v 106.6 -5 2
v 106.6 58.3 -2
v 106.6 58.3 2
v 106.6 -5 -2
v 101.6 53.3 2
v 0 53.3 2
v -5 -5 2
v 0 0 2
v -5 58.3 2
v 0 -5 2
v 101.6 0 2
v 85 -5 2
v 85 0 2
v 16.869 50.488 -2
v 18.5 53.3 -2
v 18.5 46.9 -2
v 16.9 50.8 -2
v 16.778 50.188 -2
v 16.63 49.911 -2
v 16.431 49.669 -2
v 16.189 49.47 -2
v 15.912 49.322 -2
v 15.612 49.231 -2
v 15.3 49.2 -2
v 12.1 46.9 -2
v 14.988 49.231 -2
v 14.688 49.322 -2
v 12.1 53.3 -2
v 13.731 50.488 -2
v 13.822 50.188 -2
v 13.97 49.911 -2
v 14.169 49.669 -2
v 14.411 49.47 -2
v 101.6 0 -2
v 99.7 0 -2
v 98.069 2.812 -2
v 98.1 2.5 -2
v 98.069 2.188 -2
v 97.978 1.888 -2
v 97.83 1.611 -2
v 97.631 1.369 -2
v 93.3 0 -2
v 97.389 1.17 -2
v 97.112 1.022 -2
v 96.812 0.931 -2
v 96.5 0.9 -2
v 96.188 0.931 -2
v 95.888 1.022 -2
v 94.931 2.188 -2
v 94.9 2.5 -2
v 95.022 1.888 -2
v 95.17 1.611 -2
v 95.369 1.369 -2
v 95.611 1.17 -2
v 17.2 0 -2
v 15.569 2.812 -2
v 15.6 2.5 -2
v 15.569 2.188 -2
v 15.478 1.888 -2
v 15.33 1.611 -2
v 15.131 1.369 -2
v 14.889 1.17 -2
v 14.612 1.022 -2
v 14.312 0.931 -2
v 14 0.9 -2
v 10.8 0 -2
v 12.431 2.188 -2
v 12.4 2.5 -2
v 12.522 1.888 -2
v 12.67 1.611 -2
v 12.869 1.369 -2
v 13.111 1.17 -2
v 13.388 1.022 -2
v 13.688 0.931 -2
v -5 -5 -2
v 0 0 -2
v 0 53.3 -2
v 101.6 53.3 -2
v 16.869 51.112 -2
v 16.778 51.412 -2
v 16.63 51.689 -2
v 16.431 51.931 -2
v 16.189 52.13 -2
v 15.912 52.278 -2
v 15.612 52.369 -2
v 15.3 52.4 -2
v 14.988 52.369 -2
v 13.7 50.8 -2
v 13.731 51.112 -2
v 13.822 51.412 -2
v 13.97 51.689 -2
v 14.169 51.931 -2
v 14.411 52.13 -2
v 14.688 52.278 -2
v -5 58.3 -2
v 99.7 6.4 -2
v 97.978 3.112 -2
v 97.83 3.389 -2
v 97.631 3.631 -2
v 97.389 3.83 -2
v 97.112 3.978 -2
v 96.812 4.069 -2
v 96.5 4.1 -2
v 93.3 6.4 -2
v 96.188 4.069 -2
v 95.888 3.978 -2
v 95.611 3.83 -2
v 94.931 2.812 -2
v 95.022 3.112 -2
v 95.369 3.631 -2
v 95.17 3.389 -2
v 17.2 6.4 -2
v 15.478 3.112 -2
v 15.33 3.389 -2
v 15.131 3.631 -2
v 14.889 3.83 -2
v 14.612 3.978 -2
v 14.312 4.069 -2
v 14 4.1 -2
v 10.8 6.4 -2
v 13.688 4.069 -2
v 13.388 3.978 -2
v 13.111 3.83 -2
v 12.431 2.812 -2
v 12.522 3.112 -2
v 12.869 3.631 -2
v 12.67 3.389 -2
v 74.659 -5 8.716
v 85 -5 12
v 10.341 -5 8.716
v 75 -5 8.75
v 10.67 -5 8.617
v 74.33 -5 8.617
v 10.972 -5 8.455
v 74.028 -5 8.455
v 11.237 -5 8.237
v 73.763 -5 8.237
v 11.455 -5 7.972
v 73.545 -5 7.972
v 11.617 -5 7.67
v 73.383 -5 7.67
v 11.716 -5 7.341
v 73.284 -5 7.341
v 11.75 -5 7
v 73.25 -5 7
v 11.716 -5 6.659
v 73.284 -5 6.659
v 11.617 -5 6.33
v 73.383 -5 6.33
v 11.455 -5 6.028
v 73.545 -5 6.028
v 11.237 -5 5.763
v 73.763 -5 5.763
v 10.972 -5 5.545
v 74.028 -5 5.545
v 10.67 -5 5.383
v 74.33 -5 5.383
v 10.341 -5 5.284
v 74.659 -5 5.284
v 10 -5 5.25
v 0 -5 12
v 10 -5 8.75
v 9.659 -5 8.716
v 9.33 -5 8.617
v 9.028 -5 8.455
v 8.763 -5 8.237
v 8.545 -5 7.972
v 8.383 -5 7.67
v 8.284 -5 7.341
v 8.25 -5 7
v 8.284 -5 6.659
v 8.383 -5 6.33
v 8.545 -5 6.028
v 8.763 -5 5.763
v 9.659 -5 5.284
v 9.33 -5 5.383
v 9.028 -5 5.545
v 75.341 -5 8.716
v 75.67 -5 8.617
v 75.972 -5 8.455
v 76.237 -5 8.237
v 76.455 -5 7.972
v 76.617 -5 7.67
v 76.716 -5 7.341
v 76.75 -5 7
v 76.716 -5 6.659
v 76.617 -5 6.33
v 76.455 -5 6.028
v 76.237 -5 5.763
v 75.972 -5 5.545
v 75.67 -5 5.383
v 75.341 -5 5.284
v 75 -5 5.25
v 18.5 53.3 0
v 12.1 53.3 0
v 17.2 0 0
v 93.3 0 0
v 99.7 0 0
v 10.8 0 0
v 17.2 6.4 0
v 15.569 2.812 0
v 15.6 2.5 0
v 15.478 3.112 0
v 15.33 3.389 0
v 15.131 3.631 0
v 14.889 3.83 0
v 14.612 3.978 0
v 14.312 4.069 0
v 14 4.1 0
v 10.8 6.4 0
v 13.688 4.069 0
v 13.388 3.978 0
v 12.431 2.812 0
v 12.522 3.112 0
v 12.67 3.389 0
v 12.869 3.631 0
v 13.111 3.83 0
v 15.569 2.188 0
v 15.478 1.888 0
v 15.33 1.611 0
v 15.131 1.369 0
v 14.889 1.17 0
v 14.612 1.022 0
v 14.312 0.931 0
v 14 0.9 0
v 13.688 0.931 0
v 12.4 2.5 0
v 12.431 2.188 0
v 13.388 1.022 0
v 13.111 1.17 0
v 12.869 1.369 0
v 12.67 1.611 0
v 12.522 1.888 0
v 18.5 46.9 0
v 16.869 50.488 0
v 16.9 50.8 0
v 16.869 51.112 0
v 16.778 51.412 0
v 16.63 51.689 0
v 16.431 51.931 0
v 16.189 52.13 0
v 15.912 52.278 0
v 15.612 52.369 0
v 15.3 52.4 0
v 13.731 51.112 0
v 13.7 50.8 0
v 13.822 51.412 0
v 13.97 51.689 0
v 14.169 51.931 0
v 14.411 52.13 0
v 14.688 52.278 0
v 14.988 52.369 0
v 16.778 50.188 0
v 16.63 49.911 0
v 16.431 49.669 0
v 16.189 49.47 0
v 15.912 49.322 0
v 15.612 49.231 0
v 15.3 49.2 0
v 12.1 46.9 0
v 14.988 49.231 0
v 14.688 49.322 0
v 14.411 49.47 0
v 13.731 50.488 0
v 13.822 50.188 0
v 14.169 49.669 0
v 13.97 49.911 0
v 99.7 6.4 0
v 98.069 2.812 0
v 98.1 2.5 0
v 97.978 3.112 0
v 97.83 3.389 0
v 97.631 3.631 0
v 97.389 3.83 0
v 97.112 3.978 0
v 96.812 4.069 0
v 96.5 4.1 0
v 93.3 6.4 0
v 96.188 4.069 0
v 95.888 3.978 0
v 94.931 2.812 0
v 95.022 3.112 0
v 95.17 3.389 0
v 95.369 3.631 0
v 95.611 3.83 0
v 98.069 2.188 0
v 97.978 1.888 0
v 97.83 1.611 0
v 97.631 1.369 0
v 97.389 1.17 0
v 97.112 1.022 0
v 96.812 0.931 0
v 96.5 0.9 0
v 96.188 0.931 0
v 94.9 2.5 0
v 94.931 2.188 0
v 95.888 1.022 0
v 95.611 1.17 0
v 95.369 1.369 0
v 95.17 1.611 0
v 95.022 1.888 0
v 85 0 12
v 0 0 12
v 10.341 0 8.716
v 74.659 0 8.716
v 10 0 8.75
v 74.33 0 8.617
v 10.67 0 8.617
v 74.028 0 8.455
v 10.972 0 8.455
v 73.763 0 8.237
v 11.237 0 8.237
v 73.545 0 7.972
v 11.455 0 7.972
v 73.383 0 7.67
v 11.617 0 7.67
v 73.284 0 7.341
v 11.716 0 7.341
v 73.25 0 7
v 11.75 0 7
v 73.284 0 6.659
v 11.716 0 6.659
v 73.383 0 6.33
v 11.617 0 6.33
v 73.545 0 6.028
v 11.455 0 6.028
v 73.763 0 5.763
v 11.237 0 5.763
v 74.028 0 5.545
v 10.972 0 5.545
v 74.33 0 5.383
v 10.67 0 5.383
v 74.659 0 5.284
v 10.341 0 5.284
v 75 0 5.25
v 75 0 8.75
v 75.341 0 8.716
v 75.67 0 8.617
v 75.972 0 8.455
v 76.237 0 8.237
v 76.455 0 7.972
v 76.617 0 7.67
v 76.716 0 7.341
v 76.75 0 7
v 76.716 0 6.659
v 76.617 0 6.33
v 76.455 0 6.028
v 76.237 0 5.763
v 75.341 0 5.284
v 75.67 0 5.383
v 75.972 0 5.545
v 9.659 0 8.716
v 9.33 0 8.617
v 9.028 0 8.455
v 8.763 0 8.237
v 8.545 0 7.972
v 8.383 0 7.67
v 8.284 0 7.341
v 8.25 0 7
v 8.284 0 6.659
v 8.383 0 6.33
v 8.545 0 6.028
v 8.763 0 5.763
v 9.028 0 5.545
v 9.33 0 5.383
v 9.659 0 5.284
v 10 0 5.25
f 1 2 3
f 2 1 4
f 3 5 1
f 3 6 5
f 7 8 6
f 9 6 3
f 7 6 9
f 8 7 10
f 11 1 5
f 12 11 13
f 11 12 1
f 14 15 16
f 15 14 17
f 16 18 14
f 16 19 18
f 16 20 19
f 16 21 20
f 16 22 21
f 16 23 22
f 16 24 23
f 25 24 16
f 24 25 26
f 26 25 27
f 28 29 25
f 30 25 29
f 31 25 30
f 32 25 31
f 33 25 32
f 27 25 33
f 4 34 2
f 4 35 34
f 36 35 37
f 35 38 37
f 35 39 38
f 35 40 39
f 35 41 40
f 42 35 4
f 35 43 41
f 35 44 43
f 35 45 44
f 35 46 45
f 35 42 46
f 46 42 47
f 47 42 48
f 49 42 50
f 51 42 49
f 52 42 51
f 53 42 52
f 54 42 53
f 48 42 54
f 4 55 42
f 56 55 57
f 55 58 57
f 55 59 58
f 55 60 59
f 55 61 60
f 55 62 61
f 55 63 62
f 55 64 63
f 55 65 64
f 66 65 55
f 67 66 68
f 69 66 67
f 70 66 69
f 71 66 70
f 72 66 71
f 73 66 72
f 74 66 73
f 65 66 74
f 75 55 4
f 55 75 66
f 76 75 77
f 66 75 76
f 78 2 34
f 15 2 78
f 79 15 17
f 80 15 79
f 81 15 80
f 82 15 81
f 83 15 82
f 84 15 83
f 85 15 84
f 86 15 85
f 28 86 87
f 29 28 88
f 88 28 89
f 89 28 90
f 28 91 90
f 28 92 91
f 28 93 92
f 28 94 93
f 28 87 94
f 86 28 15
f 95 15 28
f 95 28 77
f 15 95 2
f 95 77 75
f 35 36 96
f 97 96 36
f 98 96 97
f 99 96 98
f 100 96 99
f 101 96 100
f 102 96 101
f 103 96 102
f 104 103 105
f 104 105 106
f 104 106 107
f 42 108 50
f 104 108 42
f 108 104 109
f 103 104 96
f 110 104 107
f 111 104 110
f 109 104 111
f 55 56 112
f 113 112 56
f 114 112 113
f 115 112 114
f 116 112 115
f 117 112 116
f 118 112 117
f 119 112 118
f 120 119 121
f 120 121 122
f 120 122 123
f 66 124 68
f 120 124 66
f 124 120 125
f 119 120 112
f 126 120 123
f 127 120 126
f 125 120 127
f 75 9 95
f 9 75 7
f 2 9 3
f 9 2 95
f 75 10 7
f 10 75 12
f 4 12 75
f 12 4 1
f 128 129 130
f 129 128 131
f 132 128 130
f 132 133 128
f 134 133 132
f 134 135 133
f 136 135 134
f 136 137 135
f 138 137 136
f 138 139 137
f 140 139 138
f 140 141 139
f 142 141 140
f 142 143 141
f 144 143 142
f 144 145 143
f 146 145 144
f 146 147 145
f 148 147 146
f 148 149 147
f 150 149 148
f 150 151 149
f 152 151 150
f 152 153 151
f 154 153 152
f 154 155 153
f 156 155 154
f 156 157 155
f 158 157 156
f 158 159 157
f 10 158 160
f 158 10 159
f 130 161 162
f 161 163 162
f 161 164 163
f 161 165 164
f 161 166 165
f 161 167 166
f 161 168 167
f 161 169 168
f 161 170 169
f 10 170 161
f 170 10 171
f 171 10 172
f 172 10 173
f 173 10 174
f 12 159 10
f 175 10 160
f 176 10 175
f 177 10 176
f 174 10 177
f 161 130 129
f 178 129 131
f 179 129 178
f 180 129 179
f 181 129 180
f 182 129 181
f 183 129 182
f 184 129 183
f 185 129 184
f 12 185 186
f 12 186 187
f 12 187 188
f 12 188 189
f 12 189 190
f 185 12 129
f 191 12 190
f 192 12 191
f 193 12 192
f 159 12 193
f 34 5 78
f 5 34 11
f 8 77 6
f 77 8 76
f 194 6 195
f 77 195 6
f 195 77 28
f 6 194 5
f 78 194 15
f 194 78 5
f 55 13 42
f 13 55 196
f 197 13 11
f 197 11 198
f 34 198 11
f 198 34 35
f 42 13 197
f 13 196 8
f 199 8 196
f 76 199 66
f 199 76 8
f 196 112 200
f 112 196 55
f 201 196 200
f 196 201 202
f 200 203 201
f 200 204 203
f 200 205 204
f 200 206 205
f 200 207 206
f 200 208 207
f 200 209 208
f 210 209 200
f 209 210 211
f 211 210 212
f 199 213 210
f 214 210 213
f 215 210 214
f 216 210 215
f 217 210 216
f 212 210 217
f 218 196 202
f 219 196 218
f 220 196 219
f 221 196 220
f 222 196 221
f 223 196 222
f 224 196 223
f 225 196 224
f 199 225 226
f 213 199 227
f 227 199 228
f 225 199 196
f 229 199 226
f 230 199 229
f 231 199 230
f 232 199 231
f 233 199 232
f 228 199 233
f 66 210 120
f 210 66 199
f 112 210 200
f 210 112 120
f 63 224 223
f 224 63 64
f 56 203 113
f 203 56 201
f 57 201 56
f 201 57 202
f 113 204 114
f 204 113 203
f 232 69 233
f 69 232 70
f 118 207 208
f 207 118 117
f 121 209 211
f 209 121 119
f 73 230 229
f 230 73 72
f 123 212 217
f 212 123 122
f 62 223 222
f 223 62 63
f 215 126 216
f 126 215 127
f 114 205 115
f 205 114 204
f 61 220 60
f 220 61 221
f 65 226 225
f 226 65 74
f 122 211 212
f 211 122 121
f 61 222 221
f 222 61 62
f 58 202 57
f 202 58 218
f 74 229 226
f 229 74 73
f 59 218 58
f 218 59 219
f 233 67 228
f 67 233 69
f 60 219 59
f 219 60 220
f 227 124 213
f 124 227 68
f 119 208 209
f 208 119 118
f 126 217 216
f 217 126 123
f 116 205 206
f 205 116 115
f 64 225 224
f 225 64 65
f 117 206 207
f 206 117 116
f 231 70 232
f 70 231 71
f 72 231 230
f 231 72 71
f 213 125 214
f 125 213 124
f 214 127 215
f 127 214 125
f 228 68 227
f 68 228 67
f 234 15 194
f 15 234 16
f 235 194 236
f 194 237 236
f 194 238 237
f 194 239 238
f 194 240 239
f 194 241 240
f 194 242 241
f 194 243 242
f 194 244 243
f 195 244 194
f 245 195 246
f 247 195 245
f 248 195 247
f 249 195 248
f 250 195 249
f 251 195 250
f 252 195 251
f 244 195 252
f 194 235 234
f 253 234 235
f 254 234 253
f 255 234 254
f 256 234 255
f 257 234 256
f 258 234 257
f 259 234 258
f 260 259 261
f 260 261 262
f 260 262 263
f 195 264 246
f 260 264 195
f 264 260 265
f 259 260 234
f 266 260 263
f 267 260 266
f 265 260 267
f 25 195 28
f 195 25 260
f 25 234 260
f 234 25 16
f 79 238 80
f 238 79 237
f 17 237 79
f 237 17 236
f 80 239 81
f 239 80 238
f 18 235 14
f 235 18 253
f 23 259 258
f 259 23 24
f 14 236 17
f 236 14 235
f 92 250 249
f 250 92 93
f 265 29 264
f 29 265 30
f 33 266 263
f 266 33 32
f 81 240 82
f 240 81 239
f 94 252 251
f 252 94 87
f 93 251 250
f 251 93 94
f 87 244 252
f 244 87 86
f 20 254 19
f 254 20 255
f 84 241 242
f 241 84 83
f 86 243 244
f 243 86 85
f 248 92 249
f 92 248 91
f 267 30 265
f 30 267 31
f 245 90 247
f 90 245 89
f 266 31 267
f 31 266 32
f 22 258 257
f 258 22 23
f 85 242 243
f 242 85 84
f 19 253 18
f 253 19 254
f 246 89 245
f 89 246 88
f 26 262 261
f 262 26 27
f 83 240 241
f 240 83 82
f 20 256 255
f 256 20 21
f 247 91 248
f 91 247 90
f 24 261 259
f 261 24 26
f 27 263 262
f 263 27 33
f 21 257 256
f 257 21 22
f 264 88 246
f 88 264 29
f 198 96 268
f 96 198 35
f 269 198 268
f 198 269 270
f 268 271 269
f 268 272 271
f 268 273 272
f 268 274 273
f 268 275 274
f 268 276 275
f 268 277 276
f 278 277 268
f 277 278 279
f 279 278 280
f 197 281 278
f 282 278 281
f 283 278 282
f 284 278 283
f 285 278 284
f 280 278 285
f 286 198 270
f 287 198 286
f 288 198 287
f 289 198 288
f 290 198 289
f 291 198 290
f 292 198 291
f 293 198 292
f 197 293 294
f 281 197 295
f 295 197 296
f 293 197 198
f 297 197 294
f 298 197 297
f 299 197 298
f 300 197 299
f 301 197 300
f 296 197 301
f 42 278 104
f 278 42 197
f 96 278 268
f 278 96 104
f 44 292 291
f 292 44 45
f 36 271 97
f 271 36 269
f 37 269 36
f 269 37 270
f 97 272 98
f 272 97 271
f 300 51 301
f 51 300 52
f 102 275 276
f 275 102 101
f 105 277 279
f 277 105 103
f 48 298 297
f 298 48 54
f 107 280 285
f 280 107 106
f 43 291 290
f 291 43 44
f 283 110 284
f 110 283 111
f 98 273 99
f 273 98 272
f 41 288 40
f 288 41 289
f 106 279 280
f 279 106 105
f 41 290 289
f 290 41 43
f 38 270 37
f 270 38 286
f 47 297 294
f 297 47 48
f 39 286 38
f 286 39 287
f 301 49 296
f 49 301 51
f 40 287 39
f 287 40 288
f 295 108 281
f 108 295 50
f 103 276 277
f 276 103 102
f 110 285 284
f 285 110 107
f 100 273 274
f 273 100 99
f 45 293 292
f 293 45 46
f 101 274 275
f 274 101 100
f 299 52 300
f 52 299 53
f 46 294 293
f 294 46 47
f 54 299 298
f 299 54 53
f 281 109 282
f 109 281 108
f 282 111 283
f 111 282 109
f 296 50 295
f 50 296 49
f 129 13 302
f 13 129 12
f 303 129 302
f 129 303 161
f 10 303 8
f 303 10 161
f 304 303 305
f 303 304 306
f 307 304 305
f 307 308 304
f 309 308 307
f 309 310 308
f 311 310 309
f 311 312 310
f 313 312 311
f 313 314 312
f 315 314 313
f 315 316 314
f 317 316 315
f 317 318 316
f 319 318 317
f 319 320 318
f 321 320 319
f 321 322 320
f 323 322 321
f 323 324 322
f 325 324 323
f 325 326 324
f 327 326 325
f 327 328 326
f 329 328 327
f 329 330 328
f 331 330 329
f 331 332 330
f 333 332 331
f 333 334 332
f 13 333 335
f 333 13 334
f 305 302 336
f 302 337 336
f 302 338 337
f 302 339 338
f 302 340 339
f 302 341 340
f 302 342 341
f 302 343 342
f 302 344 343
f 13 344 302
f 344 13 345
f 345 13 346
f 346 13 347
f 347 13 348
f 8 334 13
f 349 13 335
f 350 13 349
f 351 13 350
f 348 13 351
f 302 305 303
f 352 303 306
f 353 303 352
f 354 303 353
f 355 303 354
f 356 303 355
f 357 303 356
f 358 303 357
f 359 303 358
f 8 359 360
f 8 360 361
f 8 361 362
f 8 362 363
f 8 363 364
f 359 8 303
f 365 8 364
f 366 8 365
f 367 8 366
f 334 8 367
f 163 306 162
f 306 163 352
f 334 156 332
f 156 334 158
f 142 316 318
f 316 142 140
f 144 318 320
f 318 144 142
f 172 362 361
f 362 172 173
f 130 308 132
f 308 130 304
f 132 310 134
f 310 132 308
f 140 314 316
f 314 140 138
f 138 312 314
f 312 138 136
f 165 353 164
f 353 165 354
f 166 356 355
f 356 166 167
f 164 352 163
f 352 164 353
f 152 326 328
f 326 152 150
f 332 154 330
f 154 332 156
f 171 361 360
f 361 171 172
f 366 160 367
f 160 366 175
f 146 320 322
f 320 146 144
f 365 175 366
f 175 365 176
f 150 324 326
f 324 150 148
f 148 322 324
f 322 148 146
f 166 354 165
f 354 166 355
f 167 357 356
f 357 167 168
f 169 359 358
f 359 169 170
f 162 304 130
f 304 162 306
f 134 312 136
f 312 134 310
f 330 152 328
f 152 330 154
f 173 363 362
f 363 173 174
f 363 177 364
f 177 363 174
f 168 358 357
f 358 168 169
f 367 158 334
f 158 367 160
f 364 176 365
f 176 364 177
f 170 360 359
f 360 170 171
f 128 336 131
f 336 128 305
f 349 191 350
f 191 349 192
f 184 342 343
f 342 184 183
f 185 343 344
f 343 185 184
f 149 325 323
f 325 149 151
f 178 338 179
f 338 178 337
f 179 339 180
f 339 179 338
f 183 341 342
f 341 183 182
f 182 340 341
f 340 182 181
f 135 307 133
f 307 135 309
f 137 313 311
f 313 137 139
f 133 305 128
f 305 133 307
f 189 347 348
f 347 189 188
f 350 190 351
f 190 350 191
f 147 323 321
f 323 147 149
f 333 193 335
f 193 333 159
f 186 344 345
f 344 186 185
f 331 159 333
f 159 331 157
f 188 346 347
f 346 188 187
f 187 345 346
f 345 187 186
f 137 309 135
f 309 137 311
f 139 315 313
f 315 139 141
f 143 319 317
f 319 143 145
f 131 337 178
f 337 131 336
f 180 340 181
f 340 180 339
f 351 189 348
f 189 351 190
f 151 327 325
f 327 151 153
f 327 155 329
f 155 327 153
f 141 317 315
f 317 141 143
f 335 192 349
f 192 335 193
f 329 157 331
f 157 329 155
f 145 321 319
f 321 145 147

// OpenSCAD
// arduino
width = 101.6;
height = 53.3;
thickness = 2;
hole_d = 3.2;
// end arduino

sth = 5;

union() {

difference() {
	difference() {
		translate([-sth, -sth, -thickness]) {
			cube([width + sth * 2, height + sth * 2, thickness * 2]);
		}

		// arduino shelf
		translate([0, 0, -thickness]) cube([width, height, thickness * 2]);
}
}

// holes
difference() {
	translate([14 - hole_d, 0, -thickness]) hole_holder();
	translate([14, 2.5, -thickness]) hole();
}
difference() {
	translate([15.3 - hole_d, height - hole_d * 2, -thickness]) hole_holder();
	translate([15.3, height - 2.5, -thickness]) hole();
}
difference() {
	translate([99.7 - hole_d * 2, 0, -thickness]) hole_holder();
	translate([99.7 - hole_d, 2.5, -thickness]) hole();
}

psu_mount();

}

module hole_holder() {
	cube([hole_d * 2, hole_d * 2, thickness]);
}

module hole() {
	cylinder(h = thickness, d = hole_d, $fn = 32);
}

module psu_mount() {
	difference() {
		translate([0, -sth, thickness]) cube([85, 5, 10]);
		translate([10, 0.5, 7]) rotate([90, 0, 0]) cylinder(h = 6, r = 1.75, $fn=32);
		translate([75, 0.5, 7]) rotate([90, 0, 0]) cylinder(h = 6, r = 1.75, $fn=32);
	}
}
